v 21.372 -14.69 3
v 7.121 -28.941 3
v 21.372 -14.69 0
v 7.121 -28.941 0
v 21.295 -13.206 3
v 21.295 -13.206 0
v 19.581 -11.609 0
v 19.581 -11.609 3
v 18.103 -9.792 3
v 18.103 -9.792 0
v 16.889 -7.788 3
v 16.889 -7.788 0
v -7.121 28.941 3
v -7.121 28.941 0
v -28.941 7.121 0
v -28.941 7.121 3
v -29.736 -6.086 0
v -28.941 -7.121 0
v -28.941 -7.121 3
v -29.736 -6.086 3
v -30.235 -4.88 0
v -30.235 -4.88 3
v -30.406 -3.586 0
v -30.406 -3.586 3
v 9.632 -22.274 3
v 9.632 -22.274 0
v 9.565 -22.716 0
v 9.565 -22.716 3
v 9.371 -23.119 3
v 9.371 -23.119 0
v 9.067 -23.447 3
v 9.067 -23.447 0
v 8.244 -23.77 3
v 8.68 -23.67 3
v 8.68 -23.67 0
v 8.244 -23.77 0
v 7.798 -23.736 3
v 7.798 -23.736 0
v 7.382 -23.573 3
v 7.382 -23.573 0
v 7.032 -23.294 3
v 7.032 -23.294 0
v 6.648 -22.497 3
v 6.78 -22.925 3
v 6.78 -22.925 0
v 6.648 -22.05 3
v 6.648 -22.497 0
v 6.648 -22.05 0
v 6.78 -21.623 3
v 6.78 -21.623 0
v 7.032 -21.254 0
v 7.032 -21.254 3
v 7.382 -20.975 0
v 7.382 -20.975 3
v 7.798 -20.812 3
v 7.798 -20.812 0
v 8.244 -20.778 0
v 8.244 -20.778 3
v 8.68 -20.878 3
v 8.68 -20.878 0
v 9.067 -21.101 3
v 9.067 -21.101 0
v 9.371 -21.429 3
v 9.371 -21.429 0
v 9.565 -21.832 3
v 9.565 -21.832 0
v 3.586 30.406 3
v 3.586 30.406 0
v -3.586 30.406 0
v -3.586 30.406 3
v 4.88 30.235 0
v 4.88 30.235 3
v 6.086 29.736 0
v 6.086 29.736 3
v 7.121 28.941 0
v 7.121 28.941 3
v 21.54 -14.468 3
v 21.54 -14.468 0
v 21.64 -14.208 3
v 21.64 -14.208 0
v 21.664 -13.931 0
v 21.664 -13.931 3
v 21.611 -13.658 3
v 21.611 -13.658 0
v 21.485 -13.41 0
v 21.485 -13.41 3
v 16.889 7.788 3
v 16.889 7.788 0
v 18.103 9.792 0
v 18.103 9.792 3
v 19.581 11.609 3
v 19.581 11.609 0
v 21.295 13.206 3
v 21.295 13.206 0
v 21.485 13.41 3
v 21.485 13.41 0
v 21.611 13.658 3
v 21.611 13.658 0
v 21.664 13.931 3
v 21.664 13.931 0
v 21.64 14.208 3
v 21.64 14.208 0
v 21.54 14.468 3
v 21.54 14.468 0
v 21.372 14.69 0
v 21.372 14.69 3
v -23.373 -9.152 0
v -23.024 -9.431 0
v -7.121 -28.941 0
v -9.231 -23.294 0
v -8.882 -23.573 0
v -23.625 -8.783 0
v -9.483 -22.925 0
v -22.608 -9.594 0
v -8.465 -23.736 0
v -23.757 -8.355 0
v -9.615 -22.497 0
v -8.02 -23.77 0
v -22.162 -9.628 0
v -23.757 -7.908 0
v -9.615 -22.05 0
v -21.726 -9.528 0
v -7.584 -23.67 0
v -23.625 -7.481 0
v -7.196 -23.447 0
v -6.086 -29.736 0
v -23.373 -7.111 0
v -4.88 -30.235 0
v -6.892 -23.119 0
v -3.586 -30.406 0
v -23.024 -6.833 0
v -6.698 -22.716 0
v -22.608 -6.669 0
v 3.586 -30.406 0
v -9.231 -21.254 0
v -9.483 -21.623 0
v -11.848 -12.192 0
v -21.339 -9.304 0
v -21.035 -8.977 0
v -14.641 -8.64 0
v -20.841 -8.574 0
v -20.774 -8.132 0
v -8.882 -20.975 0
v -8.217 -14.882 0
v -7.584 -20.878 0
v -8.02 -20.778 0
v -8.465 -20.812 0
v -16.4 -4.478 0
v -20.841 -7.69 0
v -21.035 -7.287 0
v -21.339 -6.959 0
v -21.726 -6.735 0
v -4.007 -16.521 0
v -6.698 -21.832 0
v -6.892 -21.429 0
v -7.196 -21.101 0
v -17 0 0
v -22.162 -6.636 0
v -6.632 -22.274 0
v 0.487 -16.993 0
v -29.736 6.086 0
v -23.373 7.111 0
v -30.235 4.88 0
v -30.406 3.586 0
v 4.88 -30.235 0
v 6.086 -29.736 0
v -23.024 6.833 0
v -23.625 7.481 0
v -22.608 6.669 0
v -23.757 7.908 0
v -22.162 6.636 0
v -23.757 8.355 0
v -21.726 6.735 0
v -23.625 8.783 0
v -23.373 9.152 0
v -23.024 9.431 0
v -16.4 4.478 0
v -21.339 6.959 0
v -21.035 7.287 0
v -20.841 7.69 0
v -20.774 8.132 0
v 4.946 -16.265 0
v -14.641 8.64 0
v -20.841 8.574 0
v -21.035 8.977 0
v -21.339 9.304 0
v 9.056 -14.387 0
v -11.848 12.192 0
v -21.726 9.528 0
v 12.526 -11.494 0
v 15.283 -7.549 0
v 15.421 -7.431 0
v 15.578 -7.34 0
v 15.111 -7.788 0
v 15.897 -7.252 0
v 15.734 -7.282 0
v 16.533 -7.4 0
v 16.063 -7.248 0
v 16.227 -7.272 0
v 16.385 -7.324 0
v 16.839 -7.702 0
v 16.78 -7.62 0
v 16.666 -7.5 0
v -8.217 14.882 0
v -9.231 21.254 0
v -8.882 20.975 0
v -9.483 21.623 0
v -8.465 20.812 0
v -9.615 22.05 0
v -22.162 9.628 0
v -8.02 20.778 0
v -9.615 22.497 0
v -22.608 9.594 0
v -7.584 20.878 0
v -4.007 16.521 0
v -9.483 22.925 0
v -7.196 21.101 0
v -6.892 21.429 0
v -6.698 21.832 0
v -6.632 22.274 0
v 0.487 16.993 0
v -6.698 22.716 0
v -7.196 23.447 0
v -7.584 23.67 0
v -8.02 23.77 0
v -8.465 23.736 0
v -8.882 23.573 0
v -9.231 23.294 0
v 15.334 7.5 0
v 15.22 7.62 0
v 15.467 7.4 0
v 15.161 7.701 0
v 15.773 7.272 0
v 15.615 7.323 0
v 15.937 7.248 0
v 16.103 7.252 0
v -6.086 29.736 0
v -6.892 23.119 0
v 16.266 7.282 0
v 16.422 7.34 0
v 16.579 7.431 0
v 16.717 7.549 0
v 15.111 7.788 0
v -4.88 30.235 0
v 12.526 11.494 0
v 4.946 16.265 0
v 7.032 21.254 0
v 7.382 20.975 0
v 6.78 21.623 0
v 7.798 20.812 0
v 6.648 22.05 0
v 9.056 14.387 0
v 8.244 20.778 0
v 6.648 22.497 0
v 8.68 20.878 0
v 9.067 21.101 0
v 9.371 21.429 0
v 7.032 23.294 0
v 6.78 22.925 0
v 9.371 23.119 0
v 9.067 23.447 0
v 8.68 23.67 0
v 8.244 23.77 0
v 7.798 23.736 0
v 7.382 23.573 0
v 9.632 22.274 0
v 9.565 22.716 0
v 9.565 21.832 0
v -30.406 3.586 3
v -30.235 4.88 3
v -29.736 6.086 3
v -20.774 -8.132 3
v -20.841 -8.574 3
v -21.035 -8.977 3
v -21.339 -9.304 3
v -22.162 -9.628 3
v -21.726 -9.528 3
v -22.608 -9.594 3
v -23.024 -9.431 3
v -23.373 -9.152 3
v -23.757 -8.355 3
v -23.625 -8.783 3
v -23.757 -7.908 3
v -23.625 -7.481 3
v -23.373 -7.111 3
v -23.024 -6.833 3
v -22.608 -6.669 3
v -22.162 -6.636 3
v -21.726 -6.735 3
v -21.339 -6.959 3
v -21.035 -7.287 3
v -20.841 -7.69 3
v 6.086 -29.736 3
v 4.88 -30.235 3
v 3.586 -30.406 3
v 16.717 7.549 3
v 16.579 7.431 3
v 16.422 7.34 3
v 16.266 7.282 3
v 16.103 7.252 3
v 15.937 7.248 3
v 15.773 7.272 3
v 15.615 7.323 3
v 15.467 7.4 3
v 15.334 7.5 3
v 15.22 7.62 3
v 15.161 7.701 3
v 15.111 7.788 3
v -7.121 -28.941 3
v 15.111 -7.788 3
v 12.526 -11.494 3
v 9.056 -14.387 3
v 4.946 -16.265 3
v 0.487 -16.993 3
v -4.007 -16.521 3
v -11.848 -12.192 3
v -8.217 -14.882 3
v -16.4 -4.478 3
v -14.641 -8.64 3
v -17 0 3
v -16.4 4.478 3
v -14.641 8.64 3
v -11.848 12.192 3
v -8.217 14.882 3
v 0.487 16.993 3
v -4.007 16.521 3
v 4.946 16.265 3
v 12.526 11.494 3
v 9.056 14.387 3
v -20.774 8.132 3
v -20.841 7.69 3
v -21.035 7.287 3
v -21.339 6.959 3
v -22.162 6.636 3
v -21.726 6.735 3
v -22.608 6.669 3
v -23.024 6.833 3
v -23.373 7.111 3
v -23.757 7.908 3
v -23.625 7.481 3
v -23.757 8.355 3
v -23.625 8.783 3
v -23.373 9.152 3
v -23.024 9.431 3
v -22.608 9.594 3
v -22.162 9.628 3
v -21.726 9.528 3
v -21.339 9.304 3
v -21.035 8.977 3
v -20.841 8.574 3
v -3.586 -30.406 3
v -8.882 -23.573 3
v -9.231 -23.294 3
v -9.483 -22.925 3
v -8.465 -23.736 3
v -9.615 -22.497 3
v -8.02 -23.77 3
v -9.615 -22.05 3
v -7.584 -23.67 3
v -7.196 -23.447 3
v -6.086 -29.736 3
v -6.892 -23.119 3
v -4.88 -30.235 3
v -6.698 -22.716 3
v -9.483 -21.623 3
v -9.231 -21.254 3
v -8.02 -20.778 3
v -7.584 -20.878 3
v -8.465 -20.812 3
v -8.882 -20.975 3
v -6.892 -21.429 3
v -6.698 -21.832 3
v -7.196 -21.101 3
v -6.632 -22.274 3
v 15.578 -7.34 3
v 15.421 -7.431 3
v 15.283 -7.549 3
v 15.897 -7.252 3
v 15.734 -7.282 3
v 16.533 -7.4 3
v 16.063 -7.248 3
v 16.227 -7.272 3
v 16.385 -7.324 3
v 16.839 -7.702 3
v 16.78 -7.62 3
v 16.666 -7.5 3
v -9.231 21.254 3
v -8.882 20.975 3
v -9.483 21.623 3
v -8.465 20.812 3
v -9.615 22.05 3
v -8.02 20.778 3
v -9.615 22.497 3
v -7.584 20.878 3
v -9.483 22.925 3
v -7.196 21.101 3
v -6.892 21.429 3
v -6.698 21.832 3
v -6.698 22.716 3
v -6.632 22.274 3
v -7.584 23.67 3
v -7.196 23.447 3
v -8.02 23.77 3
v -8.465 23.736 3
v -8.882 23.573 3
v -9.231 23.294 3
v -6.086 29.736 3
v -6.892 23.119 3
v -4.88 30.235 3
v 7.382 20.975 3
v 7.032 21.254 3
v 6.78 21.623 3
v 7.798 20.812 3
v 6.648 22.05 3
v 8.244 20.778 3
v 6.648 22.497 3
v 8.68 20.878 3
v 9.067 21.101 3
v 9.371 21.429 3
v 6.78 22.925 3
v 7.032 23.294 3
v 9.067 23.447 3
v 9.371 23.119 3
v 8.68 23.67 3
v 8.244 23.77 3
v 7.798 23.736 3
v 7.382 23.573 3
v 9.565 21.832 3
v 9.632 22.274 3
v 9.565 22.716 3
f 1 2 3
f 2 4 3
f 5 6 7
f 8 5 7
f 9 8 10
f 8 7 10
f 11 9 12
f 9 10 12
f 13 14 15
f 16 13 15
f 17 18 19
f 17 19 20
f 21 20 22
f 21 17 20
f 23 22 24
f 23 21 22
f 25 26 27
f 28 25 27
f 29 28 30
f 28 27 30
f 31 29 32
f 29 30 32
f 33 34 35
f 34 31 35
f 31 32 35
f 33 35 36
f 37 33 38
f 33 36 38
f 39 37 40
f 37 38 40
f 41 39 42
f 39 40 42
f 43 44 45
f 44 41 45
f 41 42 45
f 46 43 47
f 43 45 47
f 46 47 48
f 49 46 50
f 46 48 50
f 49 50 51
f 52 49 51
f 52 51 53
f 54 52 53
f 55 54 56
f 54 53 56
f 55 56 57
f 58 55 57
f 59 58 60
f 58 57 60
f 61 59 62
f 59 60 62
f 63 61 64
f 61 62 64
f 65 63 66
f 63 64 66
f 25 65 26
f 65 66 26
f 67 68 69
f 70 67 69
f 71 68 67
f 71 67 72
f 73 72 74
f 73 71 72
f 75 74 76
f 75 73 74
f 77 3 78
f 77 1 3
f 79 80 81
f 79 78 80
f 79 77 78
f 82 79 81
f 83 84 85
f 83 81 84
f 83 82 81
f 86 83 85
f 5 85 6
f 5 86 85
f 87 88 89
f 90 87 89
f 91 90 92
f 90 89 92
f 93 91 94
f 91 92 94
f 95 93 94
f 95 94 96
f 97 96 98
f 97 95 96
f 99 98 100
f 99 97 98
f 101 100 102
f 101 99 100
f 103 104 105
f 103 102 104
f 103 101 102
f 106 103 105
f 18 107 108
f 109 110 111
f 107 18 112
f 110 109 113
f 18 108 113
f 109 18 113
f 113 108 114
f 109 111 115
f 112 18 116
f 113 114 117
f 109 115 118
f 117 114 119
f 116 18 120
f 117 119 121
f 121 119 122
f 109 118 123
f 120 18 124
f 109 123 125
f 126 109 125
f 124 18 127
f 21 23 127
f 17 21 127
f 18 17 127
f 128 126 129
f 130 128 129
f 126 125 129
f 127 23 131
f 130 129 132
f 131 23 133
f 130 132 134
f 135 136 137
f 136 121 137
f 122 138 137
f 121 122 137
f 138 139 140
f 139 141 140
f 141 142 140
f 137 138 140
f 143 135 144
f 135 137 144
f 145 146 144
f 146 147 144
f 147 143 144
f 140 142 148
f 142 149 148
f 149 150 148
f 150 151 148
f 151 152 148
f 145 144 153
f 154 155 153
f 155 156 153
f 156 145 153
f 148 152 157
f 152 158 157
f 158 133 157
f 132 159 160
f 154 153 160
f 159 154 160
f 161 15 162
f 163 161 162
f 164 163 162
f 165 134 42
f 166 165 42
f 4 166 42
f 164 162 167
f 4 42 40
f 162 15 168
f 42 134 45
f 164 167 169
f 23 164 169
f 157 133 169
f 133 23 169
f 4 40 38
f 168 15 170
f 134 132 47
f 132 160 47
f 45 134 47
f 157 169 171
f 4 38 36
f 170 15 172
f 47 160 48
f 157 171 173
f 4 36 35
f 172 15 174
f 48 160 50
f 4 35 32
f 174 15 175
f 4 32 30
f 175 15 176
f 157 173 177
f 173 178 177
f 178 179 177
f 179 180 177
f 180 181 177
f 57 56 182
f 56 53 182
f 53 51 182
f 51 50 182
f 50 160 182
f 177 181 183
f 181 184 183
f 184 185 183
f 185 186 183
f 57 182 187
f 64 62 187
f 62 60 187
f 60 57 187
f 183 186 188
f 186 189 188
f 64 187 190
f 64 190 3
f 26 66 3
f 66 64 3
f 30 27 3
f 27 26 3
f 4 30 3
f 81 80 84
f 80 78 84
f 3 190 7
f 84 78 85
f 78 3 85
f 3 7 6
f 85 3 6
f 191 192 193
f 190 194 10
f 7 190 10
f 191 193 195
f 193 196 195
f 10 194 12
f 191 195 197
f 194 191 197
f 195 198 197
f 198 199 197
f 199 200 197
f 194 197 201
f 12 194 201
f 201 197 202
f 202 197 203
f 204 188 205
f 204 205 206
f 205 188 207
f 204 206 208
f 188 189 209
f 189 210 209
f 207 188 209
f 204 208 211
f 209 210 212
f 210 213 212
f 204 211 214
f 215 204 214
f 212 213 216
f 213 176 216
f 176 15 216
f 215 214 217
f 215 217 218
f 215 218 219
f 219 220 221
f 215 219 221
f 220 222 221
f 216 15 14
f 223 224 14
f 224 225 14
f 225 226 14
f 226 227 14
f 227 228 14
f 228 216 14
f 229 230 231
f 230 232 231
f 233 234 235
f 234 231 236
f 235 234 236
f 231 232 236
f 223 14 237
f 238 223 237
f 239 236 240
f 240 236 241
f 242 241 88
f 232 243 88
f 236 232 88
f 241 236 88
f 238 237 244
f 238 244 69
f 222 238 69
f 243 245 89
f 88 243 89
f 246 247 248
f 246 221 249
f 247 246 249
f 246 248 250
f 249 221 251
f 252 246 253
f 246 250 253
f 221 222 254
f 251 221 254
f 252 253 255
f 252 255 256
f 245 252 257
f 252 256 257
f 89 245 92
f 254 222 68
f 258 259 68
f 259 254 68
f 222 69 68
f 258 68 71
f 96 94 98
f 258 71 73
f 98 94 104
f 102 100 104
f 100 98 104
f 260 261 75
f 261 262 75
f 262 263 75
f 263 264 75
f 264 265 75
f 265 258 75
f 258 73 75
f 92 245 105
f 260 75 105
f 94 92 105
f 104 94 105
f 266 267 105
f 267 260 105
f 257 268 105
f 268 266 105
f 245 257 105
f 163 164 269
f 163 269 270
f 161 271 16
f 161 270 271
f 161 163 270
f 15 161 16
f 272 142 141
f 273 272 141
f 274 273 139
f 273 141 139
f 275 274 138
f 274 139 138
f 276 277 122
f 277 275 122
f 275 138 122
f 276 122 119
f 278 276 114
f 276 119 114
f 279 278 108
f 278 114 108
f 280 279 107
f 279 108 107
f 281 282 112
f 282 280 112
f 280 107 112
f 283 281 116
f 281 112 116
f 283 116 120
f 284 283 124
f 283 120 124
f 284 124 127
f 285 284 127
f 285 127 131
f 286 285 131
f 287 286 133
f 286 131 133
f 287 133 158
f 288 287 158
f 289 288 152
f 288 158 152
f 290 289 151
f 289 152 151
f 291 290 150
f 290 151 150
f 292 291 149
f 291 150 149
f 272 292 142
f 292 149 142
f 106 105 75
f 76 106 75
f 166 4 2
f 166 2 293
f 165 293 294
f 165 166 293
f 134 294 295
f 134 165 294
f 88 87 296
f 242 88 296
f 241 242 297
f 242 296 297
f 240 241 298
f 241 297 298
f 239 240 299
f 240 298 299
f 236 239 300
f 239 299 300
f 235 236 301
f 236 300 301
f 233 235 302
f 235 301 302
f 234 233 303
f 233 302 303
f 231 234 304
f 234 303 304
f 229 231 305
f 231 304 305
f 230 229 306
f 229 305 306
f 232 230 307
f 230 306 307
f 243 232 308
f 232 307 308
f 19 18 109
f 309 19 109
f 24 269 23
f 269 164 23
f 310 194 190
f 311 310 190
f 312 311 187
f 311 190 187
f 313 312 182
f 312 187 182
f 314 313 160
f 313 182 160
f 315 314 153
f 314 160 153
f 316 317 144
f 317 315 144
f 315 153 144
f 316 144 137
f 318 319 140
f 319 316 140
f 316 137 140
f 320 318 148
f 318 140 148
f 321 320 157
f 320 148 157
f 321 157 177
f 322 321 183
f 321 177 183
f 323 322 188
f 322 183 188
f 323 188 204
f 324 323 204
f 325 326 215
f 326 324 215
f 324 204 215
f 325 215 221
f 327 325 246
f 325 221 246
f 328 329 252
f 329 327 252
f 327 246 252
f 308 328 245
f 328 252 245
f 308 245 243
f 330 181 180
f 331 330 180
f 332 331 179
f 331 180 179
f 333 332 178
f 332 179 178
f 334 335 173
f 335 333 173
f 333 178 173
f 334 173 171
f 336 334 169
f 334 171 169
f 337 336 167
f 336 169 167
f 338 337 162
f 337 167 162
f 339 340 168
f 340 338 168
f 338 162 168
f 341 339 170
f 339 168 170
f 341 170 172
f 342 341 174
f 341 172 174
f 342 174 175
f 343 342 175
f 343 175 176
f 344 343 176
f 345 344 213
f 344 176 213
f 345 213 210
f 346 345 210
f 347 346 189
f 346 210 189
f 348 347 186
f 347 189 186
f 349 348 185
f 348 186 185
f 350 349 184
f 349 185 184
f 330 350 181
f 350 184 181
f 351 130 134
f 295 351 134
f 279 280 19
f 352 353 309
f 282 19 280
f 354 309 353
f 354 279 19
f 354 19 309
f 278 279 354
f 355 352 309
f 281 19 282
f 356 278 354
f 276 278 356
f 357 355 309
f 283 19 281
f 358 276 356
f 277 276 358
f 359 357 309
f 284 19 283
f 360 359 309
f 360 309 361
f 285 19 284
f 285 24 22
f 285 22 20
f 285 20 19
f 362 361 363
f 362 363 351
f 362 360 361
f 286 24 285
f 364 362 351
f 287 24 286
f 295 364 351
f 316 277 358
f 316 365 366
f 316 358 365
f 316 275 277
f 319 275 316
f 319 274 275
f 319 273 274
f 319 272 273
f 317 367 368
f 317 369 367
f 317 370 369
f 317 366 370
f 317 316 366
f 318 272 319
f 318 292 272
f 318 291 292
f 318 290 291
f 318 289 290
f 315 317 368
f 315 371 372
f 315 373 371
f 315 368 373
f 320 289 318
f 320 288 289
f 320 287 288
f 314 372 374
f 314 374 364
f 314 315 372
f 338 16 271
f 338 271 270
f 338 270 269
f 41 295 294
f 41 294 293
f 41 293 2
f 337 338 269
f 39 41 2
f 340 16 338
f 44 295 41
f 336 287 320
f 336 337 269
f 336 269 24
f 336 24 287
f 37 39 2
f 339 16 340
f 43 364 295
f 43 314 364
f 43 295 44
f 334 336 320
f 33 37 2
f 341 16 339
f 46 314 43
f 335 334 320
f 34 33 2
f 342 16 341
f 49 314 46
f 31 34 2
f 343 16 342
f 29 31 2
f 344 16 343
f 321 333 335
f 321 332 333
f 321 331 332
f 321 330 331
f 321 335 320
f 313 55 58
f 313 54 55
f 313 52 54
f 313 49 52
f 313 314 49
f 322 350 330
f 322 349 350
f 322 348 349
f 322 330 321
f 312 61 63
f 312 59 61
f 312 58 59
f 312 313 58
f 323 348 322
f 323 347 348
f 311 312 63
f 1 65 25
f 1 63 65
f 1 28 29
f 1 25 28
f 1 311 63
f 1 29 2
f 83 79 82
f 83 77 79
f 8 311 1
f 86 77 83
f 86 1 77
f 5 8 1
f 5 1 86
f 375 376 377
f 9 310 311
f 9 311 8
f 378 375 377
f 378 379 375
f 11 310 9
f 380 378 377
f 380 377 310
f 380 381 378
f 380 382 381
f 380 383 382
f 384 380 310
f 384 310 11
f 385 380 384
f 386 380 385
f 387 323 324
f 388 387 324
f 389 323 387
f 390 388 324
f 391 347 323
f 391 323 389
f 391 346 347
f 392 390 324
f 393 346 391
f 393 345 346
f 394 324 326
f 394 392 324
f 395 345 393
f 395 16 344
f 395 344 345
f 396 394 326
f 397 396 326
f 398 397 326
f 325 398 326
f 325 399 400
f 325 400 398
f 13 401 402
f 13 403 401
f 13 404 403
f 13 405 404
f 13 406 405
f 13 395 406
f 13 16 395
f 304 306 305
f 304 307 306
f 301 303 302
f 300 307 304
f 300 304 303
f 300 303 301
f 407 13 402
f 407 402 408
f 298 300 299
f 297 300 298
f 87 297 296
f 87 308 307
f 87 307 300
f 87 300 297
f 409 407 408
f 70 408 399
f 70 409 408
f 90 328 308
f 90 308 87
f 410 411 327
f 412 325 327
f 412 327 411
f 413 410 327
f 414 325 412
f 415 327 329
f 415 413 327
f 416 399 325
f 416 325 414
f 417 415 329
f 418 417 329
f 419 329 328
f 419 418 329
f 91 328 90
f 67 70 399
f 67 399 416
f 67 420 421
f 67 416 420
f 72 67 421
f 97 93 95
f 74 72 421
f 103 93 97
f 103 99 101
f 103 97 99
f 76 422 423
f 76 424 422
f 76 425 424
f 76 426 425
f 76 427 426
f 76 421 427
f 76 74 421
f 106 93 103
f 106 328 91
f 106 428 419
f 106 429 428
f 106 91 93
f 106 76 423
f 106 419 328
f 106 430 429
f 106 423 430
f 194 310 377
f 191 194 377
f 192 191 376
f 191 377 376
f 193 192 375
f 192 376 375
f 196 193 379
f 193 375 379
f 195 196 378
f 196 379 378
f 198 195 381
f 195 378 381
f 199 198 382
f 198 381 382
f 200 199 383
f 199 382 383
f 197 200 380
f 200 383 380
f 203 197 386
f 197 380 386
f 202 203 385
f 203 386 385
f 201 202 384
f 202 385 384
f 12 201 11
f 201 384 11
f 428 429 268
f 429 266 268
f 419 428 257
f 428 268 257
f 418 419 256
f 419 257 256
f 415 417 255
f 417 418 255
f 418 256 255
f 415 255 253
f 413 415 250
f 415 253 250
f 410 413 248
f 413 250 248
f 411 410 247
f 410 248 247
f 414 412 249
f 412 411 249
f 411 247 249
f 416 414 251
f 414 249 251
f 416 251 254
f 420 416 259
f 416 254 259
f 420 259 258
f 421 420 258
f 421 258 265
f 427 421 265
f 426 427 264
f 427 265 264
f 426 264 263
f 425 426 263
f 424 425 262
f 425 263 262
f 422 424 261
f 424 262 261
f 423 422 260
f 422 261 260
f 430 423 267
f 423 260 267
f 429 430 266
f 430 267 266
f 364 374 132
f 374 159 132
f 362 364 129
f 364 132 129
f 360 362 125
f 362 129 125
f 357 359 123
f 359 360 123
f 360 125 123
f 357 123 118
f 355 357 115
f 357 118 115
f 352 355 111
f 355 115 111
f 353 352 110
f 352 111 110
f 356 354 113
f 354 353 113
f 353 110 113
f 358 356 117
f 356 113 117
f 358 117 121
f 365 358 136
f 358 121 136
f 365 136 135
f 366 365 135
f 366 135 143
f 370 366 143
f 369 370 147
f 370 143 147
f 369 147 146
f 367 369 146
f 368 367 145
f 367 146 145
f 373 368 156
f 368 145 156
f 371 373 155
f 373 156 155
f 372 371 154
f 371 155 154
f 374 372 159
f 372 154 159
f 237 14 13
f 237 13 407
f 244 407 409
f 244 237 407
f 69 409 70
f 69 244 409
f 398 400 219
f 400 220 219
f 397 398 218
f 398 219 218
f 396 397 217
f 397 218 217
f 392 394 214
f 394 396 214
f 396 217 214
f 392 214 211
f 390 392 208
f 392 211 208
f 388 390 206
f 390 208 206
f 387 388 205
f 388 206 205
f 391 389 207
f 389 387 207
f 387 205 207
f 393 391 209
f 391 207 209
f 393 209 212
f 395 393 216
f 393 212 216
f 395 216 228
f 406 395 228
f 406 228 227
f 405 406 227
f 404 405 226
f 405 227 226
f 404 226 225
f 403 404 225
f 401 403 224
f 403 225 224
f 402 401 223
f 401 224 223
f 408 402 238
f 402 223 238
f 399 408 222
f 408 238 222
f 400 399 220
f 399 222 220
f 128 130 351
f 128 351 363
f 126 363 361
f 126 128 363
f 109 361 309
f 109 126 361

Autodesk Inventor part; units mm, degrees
ref_plane "YZ Plane" through (0, 0, 0) normal (1, 0, 0) x (0, 1, 0)
ref_plane "XZ Plane" through (0, 0, 0) normal (0, 1, 0) x (-1, 0, 0)
ref_plane "XY Plane" through (0, 0, 0) normal (0, 0, 1) x (1, 0, 0)
sketch "Sketch1" plane through (0, 0, 0) normal (0, 0, 1) x (1, 0, 0)
  arc A0 (-3.5858, 30.4056) -> (-7.1213, 28.9411) centre (-3.5858, 25.4056) ccw
  line L0 (-7.1213, 28.9411) -> (-28.9411, 7.1213)
  arc A1 (-28.9411, 7.1213) -> (-30.4056, 3.5858) centre (-25.4056, 3.5858) ccw
  line L1 (-30.4056, 3.5858) -> (-30.4056, -3.5858)
  arc A2 (-30.4056, -3.5858) -> (-28.9411, -7.1213) centre (-25.4056, -3.5858) ccw
  line L2 (-28.9411, -7.1213) -> (-7.1213, -28.9411)
  arc A3 (-7.1213, -28.9411) -> (-3.5858, -30.4056) centre (-3.5858, -25.4056) ccw
  line L3 (-3.5858, -30.4056) -> (3.5858, -30.4056)
  arc A4 (3.5858, -30.4056) -> (7.1213, -28.9411) centre (3.5858, -25.4056) ccw
  line L4 (7.1213, -28.9411) -> (22.1833, -13.8792)
  arc A5 (16, -5.7446) -> (22.1833, -13.8792) centre (32, 0) ccw
  arc A6 (16, 5.7446) -> (16, -5.7446) centre (0, 0) ccw
  arc A7 (22.1833, 13.8792) -> (16, 5.7446) centre (32, 0) ccw
  line L5 (22.1833, 13.8792) -> (7.1213, 28.9411)
  arc A8 (7.1213, 28.9411) -> (3.5858, 30.4056) centre (3.5858, 25.4056) ccw
  line L6 (3.5858, 30.4056) -> (-3.5858, 30.4056)
  circle A9 centre (-8.1317, 22.2739) radius 1.5
  circle A10 centre (-22.2739, 8.1317) radius 1.5
  circle A11 centre (8.1317, -22.2739) radius 1.5
  circle A12 centre (-8.1317, -22.2739) radius 1.5
  circle A13 centre (8.1317, 22.2739) radius 1.5
  circle A14 centre (-22.2739, -8.1317) radius 1.5
  point P0 (0, 0)
extrude "Extrusion1" add sketch "Sketch1" along normal blind 3
fillet "Fillet1" radius 1 4 edges at (16, 5.7446, 1.5) (22.1833, 13.8792, 1.5) (16, -5.7446, 1.5) (22.1833, -13.8792, 1.5)
properties part number "VAM_housing_top"
